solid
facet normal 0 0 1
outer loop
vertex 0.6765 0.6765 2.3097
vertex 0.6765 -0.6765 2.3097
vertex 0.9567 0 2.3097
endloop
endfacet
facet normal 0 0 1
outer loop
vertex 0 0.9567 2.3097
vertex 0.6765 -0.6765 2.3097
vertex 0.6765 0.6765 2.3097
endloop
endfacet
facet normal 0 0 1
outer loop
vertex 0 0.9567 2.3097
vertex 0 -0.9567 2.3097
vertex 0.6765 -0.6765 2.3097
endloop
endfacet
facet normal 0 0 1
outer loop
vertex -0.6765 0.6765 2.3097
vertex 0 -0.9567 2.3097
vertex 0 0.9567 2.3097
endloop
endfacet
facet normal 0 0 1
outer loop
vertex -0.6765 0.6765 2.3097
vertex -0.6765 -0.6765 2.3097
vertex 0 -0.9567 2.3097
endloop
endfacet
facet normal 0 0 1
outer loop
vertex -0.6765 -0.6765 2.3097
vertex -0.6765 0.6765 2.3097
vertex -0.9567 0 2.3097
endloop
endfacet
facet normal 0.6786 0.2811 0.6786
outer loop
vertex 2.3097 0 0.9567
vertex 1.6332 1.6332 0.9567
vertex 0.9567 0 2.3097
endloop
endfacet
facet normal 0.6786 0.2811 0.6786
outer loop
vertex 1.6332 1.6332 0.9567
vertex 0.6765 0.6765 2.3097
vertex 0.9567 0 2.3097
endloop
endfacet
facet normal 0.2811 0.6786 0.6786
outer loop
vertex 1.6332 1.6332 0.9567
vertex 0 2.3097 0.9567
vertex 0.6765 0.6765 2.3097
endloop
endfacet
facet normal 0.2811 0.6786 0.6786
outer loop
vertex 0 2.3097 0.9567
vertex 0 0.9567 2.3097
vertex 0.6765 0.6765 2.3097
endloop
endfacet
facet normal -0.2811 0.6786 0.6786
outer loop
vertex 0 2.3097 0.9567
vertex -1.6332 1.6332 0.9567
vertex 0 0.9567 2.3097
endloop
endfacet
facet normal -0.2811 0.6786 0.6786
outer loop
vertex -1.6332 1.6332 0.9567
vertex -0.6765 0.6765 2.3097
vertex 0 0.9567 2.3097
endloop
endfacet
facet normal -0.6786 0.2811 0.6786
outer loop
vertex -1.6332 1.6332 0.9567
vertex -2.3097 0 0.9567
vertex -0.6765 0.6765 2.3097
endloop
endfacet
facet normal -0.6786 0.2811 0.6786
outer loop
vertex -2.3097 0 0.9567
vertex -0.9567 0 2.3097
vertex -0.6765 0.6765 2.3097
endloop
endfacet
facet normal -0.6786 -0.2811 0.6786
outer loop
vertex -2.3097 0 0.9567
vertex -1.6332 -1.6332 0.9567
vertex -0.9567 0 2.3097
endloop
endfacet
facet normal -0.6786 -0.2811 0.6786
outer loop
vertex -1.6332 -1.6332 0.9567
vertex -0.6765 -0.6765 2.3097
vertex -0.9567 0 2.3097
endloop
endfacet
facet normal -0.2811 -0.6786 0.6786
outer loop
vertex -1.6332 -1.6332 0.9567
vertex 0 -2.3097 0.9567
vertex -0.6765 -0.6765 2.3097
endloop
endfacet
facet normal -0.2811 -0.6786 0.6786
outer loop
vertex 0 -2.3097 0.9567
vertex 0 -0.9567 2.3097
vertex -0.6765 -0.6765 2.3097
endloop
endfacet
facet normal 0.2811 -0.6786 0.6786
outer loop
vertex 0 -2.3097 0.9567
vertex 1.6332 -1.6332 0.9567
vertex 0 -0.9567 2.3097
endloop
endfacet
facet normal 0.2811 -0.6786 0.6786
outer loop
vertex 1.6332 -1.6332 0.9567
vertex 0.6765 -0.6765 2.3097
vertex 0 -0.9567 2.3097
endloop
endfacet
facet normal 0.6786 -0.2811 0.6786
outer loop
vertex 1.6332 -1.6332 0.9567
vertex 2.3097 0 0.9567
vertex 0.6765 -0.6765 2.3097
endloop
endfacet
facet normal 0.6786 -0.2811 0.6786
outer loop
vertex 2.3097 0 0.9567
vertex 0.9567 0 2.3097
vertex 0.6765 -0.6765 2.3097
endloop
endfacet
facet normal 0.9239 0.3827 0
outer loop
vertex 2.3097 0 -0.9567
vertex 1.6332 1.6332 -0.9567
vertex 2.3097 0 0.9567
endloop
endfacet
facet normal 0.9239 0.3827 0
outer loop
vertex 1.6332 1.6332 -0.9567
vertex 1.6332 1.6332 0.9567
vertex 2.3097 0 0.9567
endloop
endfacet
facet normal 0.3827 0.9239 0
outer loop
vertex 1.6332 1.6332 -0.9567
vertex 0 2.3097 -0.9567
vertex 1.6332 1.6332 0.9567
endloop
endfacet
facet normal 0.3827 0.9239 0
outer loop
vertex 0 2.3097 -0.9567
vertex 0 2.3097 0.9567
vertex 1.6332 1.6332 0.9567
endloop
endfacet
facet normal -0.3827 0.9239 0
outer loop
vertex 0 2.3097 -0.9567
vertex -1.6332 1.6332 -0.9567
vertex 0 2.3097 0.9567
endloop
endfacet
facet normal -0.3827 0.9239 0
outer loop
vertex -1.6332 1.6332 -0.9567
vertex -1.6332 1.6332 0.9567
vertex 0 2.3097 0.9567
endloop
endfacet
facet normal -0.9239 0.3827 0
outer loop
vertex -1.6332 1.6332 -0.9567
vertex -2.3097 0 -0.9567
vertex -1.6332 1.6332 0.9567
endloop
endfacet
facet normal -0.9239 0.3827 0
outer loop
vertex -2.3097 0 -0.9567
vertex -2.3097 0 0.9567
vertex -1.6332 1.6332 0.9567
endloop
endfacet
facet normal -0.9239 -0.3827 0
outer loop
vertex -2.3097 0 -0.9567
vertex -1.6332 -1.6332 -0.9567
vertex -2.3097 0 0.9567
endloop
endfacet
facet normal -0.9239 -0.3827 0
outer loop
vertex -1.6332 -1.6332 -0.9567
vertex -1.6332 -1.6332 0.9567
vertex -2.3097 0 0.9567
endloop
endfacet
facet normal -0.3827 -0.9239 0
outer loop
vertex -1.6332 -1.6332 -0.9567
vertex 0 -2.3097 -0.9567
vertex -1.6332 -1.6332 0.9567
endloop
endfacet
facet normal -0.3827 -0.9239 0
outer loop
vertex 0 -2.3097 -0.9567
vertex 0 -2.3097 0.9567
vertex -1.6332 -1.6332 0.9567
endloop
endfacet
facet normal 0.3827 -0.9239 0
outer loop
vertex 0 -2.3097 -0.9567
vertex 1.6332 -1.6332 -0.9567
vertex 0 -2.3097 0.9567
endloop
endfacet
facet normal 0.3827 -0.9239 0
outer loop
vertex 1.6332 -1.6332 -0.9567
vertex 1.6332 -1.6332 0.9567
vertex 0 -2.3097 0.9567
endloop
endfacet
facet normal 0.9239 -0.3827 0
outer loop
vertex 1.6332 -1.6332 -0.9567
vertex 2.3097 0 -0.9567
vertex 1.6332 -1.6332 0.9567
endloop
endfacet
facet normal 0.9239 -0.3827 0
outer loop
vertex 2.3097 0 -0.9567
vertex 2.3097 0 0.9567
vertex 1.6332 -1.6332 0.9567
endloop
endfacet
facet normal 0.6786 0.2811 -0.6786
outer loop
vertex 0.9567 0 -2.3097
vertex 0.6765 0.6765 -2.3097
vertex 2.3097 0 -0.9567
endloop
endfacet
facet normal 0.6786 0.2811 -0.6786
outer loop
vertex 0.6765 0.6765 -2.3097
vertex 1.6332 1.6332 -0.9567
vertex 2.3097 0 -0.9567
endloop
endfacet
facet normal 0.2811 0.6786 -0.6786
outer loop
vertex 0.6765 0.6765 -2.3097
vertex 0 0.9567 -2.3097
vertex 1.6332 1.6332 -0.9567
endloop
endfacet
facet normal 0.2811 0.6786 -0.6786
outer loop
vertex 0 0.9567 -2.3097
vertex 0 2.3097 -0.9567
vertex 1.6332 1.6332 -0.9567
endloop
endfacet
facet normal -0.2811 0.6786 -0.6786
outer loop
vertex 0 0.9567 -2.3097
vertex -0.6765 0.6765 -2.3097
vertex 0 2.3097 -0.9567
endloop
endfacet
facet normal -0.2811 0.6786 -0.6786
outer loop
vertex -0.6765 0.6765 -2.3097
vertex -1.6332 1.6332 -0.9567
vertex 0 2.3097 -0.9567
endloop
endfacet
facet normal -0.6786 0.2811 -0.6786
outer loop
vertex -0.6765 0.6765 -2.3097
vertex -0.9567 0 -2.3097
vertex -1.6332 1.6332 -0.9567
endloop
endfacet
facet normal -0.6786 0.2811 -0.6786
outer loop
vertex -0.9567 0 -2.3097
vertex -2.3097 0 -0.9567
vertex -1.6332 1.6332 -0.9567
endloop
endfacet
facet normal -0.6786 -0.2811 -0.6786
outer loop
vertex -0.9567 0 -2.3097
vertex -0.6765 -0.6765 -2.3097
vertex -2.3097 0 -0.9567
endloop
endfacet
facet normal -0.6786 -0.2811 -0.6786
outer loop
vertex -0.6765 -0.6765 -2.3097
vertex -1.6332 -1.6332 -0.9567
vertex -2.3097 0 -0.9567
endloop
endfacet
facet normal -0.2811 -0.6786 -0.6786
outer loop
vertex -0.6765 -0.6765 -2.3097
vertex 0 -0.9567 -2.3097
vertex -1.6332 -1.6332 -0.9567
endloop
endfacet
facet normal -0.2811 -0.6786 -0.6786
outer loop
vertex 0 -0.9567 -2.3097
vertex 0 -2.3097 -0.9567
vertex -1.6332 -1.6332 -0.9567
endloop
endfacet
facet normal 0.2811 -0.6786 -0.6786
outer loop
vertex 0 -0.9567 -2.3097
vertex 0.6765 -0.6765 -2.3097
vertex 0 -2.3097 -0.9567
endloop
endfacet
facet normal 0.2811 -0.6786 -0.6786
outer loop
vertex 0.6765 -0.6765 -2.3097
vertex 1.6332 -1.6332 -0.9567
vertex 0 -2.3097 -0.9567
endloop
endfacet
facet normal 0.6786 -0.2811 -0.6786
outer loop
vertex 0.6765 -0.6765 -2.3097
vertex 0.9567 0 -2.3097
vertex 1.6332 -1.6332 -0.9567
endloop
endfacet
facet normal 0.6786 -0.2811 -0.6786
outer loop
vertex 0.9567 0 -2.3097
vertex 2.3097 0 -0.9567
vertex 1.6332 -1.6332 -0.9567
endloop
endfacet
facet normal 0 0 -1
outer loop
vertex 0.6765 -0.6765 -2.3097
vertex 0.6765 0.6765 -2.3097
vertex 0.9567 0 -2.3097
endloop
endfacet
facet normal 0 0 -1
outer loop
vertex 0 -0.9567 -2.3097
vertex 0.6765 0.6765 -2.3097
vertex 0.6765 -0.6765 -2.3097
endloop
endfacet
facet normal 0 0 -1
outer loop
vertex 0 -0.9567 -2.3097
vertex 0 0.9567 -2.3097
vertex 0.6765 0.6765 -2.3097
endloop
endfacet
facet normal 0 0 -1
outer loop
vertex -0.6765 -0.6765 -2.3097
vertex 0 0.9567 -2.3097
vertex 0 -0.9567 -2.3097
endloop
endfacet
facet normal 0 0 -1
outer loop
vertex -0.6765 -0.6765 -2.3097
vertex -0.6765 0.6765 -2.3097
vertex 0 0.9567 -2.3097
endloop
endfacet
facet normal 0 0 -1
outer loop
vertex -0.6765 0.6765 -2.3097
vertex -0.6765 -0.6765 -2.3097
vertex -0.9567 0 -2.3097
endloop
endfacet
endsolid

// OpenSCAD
module soft_cube(size = [40, 40, 3], style = "chamfer", radius = 2.5, center = true) {
  if (style == "chamfer") {
    difference() {
      cube(size, center = center);

      // corner chamfers using angled prisms
      for (x_sign = [-1, 1])
        for (y_sign = [-1, 1])
          translate([
            x_sign * (size[0]/2 - radius),
            y_sign * (size[1]/2 - radius),
            center ? -size[2]/2 : 0
          ])
          rotate([0, 0, x_sign * y_sign * 45])
          cube([radius * 2, radius * 0.5, size[2] + 0.1]);
    }
  } else if (style == "rounded") {
    minkowski() {
      cube([
        size[0] - 2 * radius,
        size[1] - 2 * radius,
        size[2] - 2 * radius
      ], center = center);
      sphere(r = radius);
    }
  } else {
    cube(size, center = center);
  }
}
soft_cube(style = "rounded");
